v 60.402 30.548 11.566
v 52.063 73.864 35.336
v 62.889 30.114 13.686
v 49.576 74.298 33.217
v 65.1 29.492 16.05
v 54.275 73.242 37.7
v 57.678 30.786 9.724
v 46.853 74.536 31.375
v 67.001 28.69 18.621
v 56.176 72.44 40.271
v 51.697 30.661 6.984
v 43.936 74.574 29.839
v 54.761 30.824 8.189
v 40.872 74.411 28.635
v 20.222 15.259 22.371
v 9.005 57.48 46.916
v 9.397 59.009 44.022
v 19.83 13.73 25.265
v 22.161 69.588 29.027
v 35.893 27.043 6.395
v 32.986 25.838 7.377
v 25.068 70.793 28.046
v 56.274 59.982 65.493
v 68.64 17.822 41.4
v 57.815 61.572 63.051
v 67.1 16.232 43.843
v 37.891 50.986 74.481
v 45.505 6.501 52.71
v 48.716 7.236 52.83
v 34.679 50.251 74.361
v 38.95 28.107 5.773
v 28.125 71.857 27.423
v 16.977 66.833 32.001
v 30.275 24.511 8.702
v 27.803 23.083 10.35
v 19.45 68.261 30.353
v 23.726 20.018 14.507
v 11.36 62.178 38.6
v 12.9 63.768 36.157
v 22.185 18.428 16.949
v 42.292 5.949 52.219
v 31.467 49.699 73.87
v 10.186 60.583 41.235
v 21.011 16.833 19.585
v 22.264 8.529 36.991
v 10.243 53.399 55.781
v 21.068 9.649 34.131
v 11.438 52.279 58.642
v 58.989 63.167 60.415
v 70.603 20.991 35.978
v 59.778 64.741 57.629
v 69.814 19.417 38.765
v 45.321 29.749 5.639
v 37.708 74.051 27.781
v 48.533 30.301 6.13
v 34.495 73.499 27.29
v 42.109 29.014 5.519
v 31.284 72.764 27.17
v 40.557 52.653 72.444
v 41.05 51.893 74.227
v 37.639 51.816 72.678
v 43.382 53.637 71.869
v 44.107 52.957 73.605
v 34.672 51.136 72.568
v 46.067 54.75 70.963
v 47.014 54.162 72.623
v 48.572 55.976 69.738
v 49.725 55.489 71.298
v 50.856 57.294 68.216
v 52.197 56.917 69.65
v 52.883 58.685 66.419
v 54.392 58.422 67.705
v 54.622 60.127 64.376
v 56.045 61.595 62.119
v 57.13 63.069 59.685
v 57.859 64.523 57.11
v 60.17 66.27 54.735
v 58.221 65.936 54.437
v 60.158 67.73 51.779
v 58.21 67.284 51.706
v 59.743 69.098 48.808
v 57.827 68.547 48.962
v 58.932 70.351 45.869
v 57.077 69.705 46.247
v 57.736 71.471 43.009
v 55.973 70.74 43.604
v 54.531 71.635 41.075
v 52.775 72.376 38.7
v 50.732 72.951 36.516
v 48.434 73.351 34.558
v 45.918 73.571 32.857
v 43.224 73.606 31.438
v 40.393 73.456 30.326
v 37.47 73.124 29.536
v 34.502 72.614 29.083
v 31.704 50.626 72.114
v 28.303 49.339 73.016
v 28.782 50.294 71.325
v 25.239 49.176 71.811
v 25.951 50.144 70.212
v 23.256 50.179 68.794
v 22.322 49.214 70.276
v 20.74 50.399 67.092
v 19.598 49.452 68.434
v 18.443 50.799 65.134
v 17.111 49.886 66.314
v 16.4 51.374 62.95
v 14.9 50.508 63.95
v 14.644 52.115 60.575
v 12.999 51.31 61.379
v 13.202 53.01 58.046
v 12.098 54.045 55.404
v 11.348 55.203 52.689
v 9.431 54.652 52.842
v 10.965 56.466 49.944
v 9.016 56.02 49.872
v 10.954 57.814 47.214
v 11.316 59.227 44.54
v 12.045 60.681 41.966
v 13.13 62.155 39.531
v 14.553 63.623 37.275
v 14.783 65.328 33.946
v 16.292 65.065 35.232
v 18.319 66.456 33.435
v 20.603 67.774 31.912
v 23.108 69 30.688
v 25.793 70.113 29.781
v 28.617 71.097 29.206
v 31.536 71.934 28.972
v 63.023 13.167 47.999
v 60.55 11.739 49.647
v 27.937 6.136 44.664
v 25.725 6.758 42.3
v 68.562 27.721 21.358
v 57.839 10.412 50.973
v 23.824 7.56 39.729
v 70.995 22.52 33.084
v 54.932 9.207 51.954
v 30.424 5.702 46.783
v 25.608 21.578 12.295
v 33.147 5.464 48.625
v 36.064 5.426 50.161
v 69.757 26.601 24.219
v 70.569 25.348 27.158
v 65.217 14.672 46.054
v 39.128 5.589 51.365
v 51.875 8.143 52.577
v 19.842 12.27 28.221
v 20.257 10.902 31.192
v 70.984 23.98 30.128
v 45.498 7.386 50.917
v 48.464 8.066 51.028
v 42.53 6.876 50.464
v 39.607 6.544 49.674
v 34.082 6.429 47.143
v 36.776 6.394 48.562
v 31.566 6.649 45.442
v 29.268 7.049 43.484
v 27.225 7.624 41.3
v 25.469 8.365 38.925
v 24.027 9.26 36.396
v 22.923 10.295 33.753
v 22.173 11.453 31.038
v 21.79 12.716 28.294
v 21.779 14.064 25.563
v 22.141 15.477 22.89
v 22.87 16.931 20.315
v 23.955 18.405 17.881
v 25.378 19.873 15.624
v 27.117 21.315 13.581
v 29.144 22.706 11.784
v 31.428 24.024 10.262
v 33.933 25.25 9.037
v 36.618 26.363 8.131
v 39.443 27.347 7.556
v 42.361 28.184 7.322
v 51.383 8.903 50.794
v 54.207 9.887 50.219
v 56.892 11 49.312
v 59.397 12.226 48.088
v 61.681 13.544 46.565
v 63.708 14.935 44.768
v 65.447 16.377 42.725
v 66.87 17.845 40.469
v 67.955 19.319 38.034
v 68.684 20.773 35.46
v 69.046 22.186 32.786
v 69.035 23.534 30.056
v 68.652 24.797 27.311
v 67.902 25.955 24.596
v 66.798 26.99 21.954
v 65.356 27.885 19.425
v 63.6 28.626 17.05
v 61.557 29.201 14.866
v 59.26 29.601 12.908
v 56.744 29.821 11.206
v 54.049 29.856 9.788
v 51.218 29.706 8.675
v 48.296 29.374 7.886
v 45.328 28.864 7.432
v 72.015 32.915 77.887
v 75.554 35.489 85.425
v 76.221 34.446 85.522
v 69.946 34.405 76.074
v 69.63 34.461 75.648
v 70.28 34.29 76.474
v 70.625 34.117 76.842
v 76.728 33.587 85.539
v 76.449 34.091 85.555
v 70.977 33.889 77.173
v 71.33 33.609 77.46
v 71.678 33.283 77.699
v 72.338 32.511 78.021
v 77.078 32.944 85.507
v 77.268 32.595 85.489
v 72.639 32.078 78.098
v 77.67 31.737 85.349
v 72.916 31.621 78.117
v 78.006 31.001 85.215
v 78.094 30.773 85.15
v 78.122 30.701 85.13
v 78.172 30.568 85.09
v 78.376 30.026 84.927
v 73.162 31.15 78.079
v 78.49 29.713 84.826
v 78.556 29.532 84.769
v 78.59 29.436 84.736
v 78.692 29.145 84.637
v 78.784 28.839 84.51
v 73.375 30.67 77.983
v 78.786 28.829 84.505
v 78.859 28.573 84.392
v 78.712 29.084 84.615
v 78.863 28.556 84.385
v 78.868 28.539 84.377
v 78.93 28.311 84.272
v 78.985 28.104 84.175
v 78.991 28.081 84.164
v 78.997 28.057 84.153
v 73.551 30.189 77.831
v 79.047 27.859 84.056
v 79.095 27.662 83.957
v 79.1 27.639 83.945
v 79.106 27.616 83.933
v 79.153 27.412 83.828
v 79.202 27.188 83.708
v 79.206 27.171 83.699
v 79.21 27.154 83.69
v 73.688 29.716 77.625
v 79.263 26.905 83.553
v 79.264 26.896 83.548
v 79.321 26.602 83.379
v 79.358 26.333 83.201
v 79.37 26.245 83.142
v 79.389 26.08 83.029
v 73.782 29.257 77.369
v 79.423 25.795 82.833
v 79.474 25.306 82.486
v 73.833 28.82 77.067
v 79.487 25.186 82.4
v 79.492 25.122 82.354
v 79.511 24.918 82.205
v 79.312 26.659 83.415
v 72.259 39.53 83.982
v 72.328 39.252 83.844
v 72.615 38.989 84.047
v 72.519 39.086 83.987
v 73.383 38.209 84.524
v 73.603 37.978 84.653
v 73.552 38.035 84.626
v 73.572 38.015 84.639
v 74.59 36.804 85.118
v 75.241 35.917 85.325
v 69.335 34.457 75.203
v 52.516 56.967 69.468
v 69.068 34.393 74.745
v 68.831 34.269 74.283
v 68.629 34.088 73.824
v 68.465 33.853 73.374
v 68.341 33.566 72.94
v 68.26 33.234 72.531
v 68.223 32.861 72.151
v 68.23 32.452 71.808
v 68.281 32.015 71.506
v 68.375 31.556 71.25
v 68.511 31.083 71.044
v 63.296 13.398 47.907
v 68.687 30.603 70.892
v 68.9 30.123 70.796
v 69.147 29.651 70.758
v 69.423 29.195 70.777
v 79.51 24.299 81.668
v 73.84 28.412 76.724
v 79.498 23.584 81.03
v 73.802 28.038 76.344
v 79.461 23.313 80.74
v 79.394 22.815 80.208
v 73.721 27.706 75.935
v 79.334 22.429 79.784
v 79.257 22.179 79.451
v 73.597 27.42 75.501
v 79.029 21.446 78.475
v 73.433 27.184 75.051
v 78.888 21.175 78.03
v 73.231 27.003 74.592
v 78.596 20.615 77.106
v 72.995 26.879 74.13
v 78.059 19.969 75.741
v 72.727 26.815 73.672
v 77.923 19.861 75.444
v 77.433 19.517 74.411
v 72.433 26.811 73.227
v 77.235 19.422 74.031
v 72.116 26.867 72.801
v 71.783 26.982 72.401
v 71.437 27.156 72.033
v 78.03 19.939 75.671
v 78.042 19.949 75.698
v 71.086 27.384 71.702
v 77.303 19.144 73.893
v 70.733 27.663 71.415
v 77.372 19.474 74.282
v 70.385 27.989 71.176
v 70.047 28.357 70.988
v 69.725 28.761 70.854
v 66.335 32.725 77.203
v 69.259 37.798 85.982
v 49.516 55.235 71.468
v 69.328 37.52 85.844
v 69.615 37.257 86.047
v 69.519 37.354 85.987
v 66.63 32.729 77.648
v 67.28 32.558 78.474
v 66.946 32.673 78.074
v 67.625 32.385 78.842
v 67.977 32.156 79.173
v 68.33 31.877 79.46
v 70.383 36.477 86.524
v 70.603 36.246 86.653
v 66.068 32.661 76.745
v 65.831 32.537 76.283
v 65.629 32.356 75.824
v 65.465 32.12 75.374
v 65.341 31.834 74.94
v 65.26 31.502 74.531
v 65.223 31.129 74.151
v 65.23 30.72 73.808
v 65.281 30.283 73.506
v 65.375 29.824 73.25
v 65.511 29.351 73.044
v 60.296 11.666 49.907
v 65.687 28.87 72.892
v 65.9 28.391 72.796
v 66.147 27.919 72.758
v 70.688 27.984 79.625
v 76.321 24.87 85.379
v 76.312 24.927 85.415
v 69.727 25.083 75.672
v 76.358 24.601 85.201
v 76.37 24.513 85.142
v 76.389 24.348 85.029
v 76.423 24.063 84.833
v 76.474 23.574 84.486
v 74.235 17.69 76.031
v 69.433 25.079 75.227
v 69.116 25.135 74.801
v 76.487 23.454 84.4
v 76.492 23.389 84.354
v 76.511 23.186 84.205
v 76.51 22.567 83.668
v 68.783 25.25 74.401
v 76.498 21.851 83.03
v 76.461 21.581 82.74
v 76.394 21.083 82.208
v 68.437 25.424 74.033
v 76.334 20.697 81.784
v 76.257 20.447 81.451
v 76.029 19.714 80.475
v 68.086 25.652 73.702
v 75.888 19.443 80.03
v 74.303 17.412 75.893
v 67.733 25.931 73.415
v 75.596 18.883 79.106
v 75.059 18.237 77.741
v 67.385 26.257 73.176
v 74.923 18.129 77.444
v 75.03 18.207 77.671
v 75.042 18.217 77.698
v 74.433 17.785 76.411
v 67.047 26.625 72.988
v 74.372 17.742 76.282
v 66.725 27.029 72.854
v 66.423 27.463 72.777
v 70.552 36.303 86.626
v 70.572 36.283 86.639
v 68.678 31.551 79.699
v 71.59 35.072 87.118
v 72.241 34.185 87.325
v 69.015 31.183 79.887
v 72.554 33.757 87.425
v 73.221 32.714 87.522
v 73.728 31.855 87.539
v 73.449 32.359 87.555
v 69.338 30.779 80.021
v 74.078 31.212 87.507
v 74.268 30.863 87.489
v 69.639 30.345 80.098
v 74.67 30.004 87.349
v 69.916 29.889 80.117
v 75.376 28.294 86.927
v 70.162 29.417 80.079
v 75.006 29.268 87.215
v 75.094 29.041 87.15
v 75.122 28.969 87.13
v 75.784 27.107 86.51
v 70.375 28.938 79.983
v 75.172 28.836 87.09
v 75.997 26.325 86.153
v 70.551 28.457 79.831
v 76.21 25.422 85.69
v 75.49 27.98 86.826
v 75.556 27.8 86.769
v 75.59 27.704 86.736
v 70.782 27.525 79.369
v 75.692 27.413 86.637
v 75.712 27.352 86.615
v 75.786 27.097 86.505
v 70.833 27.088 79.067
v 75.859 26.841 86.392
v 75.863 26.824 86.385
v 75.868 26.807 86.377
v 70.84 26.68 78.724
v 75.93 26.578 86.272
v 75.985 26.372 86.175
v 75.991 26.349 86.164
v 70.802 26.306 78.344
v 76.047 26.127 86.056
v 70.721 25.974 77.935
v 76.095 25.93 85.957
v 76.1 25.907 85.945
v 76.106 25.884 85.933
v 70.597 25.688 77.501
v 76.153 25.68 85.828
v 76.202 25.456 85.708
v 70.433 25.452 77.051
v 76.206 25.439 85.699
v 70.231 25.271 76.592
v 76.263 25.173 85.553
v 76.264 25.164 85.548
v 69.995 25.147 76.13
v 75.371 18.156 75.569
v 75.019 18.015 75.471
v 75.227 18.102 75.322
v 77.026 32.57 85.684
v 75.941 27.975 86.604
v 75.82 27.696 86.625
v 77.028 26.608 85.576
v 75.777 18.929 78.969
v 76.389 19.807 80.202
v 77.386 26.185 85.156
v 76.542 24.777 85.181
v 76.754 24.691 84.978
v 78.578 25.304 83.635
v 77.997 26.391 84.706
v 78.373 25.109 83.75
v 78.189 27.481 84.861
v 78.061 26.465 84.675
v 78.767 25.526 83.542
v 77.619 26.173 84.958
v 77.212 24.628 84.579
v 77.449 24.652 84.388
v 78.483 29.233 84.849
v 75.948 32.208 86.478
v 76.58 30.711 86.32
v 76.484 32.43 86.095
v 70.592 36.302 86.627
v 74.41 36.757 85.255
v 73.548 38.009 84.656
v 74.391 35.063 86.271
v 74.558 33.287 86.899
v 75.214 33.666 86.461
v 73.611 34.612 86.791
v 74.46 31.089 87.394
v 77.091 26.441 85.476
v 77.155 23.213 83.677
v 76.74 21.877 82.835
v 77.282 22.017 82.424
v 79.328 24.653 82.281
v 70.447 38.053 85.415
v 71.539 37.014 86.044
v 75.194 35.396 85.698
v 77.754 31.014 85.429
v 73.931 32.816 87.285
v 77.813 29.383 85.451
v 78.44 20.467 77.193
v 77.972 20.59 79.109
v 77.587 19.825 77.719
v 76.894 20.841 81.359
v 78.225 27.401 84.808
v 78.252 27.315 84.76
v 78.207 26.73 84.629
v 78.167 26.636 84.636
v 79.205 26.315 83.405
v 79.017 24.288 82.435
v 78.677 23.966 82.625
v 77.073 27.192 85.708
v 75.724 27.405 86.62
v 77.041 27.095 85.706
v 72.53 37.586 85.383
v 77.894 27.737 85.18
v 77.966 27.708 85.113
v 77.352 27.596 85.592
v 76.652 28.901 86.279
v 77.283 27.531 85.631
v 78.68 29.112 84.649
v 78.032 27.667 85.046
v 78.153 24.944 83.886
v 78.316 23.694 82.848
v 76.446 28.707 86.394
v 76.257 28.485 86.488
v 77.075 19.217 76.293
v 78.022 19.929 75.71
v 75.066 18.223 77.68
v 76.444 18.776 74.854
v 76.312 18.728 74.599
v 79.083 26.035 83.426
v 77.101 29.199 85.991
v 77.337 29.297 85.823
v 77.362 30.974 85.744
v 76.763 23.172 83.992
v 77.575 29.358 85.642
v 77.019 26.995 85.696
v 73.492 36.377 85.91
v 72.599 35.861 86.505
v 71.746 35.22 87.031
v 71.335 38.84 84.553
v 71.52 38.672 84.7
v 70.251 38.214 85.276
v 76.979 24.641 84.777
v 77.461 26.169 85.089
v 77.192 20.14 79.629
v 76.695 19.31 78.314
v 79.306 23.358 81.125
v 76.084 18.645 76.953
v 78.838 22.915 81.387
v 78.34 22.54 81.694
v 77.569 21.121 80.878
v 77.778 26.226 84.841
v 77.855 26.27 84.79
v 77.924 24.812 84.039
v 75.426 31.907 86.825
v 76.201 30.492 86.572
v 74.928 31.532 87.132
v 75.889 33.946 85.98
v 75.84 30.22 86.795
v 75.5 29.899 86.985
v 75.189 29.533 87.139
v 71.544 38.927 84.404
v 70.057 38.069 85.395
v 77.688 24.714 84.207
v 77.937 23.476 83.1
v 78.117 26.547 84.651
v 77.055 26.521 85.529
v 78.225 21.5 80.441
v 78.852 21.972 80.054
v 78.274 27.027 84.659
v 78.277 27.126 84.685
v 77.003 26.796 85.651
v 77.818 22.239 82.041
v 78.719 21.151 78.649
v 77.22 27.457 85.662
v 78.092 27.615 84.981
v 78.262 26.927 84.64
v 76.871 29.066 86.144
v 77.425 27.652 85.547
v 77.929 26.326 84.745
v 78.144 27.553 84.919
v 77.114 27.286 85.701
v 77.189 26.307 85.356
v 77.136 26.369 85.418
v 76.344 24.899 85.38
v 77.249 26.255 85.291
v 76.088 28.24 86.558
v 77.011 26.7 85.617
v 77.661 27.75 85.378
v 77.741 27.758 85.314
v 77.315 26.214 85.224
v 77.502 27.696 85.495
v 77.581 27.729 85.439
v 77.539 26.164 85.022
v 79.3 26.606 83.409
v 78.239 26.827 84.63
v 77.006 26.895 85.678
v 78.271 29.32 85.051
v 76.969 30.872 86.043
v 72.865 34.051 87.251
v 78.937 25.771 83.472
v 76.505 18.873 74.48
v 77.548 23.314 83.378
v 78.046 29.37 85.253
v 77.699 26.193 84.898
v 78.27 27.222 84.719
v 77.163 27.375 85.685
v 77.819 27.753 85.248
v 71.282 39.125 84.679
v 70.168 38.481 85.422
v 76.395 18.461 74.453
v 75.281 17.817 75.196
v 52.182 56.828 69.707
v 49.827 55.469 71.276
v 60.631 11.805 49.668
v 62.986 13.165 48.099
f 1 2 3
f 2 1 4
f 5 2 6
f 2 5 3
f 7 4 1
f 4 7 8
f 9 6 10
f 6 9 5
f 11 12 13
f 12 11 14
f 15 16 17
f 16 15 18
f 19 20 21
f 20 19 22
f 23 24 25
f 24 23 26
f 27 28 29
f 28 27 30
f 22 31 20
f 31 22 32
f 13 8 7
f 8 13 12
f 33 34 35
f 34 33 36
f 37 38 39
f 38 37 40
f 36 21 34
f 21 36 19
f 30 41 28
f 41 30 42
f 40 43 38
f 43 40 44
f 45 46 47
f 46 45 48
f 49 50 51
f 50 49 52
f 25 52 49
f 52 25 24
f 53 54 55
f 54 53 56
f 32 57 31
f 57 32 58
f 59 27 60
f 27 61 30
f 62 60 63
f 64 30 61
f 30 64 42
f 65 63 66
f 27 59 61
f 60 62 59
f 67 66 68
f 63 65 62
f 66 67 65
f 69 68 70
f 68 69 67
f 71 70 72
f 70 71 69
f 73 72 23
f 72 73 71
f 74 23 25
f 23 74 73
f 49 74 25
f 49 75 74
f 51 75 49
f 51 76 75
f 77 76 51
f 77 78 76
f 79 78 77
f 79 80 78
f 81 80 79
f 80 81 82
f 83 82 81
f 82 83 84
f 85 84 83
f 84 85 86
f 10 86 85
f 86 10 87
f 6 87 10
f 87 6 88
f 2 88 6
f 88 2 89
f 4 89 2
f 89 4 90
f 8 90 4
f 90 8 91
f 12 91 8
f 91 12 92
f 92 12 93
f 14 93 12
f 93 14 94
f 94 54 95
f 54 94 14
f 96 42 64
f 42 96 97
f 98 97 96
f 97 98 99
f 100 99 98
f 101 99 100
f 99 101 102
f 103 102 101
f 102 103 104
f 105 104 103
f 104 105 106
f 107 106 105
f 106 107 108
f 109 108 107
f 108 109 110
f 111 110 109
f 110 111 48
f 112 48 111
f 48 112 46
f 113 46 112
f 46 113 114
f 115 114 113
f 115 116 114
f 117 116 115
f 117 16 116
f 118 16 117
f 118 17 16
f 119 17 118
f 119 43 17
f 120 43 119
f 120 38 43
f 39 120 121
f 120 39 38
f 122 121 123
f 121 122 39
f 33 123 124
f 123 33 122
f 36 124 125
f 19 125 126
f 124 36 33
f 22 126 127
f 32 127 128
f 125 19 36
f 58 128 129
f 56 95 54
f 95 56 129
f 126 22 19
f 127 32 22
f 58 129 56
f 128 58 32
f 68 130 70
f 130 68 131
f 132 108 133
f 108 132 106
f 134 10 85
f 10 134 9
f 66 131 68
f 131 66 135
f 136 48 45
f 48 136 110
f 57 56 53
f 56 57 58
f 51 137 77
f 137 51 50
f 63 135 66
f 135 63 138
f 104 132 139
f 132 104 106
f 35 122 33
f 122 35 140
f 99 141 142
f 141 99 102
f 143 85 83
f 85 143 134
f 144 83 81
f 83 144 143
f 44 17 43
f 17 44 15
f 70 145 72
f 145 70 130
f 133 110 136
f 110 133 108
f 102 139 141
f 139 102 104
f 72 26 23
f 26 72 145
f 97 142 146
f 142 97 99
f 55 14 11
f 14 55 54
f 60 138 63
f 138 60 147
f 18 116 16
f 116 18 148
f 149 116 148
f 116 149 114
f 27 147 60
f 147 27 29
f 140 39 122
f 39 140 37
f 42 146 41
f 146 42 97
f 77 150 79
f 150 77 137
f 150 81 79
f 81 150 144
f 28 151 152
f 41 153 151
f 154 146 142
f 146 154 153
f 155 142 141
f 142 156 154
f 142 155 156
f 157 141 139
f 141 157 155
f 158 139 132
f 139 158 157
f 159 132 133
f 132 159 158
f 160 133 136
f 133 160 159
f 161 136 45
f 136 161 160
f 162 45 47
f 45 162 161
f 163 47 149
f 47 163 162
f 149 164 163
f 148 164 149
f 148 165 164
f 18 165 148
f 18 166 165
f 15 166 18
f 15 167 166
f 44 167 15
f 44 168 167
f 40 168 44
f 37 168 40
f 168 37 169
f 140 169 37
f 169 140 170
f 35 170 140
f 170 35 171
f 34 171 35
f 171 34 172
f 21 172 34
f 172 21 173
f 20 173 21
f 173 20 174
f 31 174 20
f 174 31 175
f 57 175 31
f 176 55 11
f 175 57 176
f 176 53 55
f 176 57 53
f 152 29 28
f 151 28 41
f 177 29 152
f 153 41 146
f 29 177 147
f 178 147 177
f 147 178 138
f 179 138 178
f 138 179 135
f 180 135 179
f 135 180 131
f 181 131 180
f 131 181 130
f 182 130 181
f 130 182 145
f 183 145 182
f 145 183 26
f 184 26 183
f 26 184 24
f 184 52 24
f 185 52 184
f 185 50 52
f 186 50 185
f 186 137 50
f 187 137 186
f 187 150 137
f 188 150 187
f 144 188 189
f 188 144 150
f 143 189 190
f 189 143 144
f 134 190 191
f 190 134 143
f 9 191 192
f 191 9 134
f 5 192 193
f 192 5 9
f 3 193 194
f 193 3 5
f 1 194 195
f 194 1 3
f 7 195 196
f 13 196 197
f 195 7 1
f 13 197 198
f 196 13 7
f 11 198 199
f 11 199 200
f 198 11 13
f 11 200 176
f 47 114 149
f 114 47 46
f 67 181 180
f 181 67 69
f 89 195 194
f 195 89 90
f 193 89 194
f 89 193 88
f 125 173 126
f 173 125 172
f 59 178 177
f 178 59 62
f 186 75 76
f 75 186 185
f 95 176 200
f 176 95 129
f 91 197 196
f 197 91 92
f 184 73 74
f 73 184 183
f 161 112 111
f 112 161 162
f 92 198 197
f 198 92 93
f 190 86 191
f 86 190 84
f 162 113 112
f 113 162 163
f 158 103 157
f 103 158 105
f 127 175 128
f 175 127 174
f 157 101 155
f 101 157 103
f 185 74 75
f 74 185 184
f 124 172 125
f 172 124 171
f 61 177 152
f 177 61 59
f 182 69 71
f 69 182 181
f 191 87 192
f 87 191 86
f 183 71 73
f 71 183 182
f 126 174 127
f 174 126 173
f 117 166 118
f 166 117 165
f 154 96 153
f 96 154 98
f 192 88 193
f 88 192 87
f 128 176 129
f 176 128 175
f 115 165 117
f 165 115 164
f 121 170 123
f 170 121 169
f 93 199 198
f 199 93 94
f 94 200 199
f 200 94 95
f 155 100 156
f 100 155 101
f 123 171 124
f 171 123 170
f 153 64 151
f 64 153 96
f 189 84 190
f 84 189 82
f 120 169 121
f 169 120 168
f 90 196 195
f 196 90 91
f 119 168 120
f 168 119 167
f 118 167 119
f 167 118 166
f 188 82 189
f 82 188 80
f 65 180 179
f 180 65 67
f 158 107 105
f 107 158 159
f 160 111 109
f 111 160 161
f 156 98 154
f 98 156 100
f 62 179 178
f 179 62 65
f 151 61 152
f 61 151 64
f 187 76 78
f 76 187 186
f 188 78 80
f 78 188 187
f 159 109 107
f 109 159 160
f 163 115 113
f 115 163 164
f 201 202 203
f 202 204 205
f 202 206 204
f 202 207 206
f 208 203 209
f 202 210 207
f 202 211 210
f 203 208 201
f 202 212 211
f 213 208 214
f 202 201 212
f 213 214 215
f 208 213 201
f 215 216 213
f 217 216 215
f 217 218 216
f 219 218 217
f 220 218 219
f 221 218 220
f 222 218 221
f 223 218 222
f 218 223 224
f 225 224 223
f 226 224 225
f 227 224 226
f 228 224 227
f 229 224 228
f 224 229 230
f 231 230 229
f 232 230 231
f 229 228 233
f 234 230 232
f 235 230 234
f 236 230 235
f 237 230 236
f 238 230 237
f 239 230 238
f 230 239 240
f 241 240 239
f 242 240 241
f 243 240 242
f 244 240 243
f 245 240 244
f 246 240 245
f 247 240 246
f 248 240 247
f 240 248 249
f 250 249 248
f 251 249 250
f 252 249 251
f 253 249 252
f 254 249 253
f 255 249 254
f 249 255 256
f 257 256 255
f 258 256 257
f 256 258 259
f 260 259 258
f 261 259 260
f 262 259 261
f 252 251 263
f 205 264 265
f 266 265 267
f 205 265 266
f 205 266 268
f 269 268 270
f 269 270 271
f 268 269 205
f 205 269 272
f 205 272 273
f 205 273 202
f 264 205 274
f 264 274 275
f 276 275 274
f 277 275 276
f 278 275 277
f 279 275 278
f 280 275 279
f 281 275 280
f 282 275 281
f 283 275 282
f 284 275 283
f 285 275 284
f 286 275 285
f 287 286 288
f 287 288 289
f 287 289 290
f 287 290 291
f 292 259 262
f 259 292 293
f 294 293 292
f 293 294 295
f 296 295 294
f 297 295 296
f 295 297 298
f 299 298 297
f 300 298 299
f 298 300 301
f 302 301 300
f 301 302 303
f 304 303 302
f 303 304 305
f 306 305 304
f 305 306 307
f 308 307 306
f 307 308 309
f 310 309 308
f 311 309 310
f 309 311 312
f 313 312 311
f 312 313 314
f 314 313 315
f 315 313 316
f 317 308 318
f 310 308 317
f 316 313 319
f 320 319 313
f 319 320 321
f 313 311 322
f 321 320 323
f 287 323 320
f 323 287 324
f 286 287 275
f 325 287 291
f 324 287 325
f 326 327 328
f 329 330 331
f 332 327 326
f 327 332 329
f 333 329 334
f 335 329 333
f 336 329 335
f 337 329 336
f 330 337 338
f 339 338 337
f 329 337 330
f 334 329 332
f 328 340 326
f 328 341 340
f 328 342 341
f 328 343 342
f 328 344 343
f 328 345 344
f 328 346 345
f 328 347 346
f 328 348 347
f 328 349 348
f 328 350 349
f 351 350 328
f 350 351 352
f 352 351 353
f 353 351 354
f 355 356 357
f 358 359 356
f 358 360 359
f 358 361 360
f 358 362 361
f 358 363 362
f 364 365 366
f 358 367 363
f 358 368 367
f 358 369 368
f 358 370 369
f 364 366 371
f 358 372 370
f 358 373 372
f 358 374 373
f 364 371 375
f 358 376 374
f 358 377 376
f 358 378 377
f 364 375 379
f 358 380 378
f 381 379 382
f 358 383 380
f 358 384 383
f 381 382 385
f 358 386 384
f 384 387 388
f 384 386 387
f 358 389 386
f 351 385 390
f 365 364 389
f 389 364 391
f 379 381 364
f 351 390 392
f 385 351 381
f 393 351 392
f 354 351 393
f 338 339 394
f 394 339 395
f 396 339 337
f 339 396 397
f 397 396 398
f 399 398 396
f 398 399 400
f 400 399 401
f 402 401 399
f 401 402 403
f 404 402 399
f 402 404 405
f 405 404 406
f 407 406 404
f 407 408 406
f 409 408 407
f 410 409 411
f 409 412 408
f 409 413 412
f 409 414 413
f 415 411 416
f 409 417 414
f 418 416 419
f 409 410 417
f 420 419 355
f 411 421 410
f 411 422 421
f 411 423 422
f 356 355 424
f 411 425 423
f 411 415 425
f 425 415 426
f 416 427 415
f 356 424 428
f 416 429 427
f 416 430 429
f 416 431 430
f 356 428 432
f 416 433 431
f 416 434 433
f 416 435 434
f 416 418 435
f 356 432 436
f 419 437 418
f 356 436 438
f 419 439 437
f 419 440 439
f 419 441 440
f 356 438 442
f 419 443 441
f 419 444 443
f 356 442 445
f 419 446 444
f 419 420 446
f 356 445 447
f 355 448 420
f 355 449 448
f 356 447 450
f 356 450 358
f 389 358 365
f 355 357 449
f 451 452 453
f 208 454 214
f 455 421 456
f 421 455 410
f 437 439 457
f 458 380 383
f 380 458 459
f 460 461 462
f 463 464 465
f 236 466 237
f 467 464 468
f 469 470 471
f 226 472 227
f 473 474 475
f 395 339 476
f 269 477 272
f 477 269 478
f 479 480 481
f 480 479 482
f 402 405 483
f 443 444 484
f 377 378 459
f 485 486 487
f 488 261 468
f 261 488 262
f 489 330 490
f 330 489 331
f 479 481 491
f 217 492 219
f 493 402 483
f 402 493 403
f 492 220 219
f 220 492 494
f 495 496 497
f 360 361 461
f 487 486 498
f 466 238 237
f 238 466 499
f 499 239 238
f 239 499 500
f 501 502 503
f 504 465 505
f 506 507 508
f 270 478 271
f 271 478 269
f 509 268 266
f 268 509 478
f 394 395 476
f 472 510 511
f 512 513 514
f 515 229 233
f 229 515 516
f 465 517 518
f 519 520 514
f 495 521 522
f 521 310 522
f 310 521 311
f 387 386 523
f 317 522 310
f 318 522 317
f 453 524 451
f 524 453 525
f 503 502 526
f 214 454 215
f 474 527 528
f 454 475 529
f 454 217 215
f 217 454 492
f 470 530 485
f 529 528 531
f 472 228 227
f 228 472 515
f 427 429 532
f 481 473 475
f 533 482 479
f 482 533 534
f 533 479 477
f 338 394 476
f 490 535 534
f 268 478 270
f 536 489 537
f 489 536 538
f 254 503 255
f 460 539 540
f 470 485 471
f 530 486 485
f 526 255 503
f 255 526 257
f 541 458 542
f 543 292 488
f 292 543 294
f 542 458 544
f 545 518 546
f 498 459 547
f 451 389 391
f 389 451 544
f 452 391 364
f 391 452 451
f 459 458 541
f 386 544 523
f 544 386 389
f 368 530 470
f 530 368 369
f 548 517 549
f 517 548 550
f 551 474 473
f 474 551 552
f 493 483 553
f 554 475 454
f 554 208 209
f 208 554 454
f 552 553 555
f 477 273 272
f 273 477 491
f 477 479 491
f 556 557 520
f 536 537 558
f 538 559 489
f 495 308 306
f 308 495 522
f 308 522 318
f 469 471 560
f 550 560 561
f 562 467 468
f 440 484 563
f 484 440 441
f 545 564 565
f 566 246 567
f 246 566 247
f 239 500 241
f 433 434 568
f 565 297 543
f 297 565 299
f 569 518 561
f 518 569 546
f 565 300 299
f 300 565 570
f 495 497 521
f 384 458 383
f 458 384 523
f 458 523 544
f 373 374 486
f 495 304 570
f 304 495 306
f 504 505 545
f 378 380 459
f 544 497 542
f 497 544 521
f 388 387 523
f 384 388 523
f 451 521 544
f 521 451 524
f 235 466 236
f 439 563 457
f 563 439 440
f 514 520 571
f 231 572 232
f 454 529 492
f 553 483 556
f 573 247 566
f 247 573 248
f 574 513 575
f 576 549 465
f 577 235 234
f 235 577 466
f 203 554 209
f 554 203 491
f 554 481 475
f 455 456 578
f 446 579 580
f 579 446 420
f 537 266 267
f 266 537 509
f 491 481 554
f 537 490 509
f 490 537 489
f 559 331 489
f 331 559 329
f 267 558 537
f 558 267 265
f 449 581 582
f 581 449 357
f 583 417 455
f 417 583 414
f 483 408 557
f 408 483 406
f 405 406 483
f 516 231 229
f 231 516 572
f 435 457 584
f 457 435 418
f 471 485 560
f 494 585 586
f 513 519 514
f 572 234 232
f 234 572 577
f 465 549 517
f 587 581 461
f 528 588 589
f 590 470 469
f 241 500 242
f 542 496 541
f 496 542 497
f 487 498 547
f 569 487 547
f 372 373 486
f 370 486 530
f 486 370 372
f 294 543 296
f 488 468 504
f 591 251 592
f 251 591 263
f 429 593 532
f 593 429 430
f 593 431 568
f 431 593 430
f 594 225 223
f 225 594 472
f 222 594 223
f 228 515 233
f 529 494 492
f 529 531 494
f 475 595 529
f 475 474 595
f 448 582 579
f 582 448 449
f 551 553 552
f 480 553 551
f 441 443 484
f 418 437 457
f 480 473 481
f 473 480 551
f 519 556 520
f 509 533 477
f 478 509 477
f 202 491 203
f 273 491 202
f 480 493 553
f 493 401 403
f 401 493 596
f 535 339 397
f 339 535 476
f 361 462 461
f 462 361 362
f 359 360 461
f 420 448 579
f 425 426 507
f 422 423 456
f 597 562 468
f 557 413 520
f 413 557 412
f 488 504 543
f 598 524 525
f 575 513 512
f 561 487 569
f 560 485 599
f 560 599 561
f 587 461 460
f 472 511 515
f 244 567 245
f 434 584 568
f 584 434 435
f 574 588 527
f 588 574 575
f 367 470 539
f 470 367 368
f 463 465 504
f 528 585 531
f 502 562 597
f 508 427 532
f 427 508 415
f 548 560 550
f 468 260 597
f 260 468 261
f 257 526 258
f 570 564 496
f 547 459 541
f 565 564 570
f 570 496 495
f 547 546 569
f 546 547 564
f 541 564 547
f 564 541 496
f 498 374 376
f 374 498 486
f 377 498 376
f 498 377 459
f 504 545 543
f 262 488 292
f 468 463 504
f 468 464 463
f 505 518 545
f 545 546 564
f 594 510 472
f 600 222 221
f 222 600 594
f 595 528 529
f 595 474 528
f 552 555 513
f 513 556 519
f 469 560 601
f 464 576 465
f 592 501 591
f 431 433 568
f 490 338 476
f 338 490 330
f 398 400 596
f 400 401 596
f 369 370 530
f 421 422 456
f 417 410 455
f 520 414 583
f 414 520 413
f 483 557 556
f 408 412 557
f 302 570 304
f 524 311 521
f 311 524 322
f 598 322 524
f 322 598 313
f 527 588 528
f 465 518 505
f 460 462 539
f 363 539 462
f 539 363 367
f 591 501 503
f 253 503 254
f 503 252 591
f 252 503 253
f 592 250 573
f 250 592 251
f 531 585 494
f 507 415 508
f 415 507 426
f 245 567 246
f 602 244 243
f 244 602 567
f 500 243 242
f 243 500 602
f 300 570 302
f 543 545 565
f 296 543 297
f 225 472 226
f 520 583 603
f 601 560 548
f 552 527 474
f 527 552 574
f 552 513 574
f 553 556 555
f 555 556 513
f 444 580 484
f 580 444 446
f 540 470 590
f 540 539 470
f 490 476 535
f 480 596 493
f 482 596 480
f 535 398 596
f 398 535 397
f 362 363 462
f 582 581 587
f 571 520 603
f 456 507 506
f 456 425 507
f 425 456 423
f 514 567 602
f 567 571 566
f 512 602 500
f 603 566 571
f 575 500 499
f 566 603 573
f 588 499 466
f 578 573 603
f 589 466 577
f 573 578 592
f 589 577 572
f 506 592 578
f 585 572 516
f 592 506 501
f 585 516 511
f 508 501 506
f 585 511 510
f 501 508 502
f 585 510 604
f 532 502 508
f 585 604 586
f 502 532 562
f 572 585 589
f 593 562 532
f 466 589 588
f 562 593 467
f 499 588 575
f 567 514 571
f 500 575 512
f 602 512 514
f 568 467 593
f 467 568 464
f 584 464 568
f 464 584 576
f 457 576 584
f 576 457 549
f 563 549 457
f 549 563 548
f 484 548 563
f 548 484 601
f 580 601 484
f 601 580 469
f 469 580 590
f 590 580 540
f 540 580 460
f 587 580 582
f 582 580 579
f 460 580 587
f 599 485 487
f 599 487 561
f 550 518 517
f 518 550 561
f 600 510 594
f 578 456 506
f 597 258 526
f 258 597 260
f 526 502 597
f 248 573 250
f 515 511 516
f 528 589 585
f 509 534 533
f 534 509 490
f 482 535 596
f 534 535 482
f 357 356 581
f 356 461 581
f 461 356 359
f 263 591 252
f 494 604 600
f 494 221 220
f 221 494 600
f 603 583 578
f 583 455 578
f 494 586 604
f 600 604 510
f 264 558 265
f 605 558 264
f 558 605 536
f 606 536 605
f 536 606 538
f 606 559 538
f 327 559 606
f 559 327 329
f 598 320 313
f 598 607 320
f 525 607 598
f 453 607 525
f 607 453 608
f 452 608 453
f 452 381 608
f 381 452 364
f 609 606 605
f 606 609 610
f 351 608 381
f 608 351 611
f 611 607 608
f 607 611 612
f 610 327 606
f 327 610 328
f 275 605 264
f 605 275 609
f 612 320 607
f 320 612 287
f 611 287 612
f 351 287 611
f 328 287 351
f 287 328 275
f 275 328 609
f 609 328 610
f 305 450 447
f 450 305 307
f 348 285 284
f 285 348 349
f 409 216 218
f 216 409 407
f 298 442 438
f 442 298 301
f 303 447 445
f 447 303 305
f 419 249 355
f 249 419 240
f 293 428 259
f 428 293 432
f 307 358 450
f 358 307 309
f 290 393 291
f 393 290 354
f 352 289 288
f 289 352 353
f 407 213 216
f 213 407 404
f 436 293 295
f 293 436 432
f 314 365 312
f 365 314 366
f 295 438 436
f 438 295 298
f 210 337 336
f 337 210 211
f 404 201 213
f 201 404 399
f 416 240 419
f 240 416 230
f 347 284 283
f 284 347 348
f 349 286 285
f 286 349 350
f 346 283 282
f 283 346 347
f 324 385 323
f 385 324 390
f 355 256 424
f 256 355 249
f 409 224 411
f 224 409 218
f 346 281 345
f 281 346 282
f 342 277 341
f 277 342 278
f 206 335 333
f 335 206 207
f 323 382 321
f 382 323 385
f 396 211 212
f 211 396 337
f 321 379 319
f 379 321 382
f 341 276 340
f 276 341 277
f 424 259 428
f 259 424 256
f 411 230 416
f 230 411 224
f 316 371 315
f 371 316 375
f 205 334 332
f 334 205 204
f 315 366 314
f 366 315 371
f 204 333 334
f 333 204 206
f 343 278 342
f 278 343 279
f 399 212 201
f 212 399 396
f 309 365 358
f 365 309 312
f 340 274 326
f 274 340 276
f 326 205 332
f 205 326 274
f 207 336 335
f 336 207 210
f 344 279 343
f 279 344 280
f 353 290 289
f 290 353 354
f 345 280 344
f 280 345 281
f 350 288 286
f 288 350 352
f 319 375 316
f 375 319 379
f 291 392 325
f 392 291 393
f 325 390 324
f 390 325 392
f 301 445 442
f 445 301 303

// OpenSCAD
// file: Upor.scad
Upor();


    uporWid = 50;
    thicns = 2;
    tubeDia = 48.5;
    shplintHoleDia = 8.5;
    shplintHoleHeig = 21;
    sphereRad = 13;



module Upor() {

    $fn = 50;

    py = - uporWid/2;

    // Охват
    difference() {
        
        rotate([-90,0,0]) 
        cylinder(h=uporWid, d = tubeDia+2*thicns,center=true);
        
        rotate([-90,0,0]) 
        cylinder(h=uporWid+2, d = tubeDia,center=true);           
    }

    difference() 
    {
   
        intersection() 
        {
            union() 
            {
                intersection() 
                {

                    //срез полный    
                    translate([-thicns,py,tubeDia/2+1]) 
                    cube([thicns*2, uporWid, uporWid]);

                    //сфера
                    translate([0,0,tubeDia/2+thicns+shplintHoleHeig])
                    sphere(r=sphereRad);
                }

                //срез внутренний    
                translate([-thicns,py,tubeDia/2+1]) 
                cube([thicns*2, uporWid, uporWid/2+3]);
            }

            //конус
            translate([0,0,tubeDia/2+thicns])
            cylinder(h=uporWid*tan(64)/2,d1=uporWid,d2=0);    
        }



        //цилиндр дырки
        translate([0,0,tubeDia/2+thicns+shplintHoleHeig])
        rotate([0,-90,0])
        cylinder(h=tubeDia,d=shplintHoleDia,center=true);    

    }

}
// main file
use <Upor.scad>;

translate([40,40,40]) rotate([30,30,30]) Upor();
